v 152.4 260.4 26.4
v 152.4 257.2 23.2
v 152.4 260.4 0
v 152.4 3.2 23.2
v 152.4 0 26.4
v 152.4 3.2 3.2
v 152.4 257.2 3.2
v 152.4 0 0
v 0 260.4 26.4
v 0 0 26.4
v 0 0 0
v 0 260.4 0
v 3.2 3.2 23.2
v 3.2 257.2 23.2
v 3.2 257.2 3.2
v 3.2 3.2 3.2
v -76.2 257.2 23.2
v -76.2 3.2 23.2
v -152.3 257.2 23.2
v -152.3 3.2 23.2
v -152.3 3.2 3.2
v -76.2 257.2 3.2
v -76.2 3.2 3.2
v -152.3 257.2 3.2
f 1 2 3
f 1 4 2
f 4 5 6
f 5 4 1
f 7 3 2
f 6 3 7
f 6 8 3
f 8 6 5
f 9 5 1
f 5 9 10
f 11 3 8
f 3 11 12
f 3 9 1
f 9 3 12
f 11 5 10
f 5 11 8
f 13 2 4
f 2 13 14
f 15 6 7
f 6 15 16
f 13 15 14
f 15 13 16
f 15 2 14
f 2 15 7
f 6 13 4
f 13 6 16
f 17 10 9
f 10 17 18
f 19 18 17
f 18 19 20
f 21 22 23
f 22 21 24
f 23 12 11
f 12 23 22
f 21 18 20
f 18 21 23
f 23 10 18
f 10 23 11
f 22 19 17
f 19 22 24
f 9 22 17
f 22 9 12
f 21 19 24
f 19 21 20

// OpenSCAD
use <MCAD/triangles.scad>

// The width of one layer (i.e. nozel size is 0.4mm).
layer_width = 0.4;

// Dimensions of the shelf.
shelf_width = 254; // 10 inch
shelf_length = 1828.8; // 6 feet (72 inch)
shelf_height = 20;

// How long the shelf needs to be.
needed_shelf_length = 1981.2; // 6.5 feet (78 inch)

// Part that extends the shelf.
extension = needed_shelf_length - shelf_length;

// Sleve that fits around the shelf.
sleve_wall_thickness = layer_width * 8; // Increment in number of layers.
sleve_length = extension; // Why not have it the same lenght as the extension for now.
sleve_width = shelf_width + sleve_wall_thickness*2;
sleve_height = shelf_height + sleve_wall_thickness*2;

e = 0.1;
ee = e*2;


module shelf_extension()
{
    difference() {
        // The sleve.
        cube([sleve_length, sleve_width, sleve_height]);

        // Negative space where the end of the shelf would go.
        translate([sleve_wall_thickness,sleve_wall_thickness,sleve_wall_thickness]) {
            cube([sleve_length,shelf_width,shelf_height]);
        }
    }

    // The extension.
    mirror([1,0,0]){ 
        translate([-e,sleve_wall_thickness,sleve_wall_thickness]) {
            cube([extension, shelf_width, shelf_height]);
        }
    }
    

    triangle_supports();
    intersecting_corners();
}

module triangle_supports()
{
    // Triangles for more support.

    // Top and bottom of shelf.
    translate([0,sleve_wall_thickness,shelf_height+sleve_wall_thickness]) {
        rotate(a=[90,0,180]) { 
            triangle(sleve_wall_thickness,extension/2,shelf_width);
        }
    }

    translate([0,sleve_wall_thickness,sleve_wall_thickness]) {
        mirror([0,0,1]) {
            rotate(a=[90,0,180]) { 
                triangle(sleve_wall_thickness,extension/2,shelf_width);
            }
        }
    }

    // Sides of shelf.
    translate([0,sleve_wall_thickness,sleve_wall_thickness]) {
        rotate(a=[180,180,0]) {
            triangle(sleve_wall_thickness,extension/2,shelf_height);
        }
    }
    
    translate([0,shelf_width+sleve_wall_thickness,sleve_wall_thickness]) {
        mirror([0,1,0]) { 
            rotate(a=[180,180,0]) {
                triangle(sleve_wall_thickness,extension/2,shelf_height);
            }
        }
    }
}

module intersecting_corners()
{
    intersection() {
        // Top
        translate([0,0,shelf_height+sleve_wall_thickness]) {
            rotate(a=[90,0,180]) { 
                triangle(sleve_wall_thickness,extension/2,sleve_width);
            }
        }

        // front side.
        translate([0,sleve_wall_thickness,0]) {
            rotate(a=[180,180,0]) {
                triangle(sleve_wall_thickness,extension/2,sleve_height);
            }
        }
    }

    intersection() {
        // Top
        translate([0,0,shelf_height+sleve_wall_thickness]) {
            rotate(a=[90,0,180]) { 
                triangle(sleve_wall_thickness,extension/2,sleve_width);
            }
        }

        // back side.
        translate([0,shelf_width+sleve_wall_thickness,0]) {
            mirror([0,1,0]) { 
                rotate(a=[180,180,0]) {
                    triangle(sleve_wall_thickness,extension/2,sleve_height);
                }
            }
        }
    }
    intersection() {
        // Bottom
        translate([0,0,sleve_wall_thickness]) {
            mirror([0,0,1]) {
                rotate(a=[90,0,180]) { 
                    triangle(sleve_wall_thickness,extension/2,sleve_width);
                }
            }
        }

        // front side.
        translate([0,sleve_wall_thickness,0]) {
            rotate(a=[180,180,0]) {
                triangle(sleve_wall_thickness,extension/2,sleve_height);
            }
        }
    }

    intersection() {
        // Bottom
        translate([0,0,sleve_wall_thickness]) {
            mirror([0,0,1]) {
                rotate(a=[90,0,180]) { 
                    triangle(sleve_wall_thickness,extension/2,sleve_width);
                }
            }
        }

        // back side.
        translate([0,shelf_width+sleve_wall_thickness,0]) {
            mirror([0,1,0]) { 
                rotate(a=[180,180,0]) {
                    triangle(sleve_wall_thickness,extension/2,sleve_height);
                }
            }
        }
    }
}

shelf_extension();



// Block out one half.
//difference() {
//    shelf_extension();
//    translate([-extension, -e, -e]) cube([sleve_length + extension+ee, (sleve_width/2)+ee, sleve_height+ee]);
//
//}
